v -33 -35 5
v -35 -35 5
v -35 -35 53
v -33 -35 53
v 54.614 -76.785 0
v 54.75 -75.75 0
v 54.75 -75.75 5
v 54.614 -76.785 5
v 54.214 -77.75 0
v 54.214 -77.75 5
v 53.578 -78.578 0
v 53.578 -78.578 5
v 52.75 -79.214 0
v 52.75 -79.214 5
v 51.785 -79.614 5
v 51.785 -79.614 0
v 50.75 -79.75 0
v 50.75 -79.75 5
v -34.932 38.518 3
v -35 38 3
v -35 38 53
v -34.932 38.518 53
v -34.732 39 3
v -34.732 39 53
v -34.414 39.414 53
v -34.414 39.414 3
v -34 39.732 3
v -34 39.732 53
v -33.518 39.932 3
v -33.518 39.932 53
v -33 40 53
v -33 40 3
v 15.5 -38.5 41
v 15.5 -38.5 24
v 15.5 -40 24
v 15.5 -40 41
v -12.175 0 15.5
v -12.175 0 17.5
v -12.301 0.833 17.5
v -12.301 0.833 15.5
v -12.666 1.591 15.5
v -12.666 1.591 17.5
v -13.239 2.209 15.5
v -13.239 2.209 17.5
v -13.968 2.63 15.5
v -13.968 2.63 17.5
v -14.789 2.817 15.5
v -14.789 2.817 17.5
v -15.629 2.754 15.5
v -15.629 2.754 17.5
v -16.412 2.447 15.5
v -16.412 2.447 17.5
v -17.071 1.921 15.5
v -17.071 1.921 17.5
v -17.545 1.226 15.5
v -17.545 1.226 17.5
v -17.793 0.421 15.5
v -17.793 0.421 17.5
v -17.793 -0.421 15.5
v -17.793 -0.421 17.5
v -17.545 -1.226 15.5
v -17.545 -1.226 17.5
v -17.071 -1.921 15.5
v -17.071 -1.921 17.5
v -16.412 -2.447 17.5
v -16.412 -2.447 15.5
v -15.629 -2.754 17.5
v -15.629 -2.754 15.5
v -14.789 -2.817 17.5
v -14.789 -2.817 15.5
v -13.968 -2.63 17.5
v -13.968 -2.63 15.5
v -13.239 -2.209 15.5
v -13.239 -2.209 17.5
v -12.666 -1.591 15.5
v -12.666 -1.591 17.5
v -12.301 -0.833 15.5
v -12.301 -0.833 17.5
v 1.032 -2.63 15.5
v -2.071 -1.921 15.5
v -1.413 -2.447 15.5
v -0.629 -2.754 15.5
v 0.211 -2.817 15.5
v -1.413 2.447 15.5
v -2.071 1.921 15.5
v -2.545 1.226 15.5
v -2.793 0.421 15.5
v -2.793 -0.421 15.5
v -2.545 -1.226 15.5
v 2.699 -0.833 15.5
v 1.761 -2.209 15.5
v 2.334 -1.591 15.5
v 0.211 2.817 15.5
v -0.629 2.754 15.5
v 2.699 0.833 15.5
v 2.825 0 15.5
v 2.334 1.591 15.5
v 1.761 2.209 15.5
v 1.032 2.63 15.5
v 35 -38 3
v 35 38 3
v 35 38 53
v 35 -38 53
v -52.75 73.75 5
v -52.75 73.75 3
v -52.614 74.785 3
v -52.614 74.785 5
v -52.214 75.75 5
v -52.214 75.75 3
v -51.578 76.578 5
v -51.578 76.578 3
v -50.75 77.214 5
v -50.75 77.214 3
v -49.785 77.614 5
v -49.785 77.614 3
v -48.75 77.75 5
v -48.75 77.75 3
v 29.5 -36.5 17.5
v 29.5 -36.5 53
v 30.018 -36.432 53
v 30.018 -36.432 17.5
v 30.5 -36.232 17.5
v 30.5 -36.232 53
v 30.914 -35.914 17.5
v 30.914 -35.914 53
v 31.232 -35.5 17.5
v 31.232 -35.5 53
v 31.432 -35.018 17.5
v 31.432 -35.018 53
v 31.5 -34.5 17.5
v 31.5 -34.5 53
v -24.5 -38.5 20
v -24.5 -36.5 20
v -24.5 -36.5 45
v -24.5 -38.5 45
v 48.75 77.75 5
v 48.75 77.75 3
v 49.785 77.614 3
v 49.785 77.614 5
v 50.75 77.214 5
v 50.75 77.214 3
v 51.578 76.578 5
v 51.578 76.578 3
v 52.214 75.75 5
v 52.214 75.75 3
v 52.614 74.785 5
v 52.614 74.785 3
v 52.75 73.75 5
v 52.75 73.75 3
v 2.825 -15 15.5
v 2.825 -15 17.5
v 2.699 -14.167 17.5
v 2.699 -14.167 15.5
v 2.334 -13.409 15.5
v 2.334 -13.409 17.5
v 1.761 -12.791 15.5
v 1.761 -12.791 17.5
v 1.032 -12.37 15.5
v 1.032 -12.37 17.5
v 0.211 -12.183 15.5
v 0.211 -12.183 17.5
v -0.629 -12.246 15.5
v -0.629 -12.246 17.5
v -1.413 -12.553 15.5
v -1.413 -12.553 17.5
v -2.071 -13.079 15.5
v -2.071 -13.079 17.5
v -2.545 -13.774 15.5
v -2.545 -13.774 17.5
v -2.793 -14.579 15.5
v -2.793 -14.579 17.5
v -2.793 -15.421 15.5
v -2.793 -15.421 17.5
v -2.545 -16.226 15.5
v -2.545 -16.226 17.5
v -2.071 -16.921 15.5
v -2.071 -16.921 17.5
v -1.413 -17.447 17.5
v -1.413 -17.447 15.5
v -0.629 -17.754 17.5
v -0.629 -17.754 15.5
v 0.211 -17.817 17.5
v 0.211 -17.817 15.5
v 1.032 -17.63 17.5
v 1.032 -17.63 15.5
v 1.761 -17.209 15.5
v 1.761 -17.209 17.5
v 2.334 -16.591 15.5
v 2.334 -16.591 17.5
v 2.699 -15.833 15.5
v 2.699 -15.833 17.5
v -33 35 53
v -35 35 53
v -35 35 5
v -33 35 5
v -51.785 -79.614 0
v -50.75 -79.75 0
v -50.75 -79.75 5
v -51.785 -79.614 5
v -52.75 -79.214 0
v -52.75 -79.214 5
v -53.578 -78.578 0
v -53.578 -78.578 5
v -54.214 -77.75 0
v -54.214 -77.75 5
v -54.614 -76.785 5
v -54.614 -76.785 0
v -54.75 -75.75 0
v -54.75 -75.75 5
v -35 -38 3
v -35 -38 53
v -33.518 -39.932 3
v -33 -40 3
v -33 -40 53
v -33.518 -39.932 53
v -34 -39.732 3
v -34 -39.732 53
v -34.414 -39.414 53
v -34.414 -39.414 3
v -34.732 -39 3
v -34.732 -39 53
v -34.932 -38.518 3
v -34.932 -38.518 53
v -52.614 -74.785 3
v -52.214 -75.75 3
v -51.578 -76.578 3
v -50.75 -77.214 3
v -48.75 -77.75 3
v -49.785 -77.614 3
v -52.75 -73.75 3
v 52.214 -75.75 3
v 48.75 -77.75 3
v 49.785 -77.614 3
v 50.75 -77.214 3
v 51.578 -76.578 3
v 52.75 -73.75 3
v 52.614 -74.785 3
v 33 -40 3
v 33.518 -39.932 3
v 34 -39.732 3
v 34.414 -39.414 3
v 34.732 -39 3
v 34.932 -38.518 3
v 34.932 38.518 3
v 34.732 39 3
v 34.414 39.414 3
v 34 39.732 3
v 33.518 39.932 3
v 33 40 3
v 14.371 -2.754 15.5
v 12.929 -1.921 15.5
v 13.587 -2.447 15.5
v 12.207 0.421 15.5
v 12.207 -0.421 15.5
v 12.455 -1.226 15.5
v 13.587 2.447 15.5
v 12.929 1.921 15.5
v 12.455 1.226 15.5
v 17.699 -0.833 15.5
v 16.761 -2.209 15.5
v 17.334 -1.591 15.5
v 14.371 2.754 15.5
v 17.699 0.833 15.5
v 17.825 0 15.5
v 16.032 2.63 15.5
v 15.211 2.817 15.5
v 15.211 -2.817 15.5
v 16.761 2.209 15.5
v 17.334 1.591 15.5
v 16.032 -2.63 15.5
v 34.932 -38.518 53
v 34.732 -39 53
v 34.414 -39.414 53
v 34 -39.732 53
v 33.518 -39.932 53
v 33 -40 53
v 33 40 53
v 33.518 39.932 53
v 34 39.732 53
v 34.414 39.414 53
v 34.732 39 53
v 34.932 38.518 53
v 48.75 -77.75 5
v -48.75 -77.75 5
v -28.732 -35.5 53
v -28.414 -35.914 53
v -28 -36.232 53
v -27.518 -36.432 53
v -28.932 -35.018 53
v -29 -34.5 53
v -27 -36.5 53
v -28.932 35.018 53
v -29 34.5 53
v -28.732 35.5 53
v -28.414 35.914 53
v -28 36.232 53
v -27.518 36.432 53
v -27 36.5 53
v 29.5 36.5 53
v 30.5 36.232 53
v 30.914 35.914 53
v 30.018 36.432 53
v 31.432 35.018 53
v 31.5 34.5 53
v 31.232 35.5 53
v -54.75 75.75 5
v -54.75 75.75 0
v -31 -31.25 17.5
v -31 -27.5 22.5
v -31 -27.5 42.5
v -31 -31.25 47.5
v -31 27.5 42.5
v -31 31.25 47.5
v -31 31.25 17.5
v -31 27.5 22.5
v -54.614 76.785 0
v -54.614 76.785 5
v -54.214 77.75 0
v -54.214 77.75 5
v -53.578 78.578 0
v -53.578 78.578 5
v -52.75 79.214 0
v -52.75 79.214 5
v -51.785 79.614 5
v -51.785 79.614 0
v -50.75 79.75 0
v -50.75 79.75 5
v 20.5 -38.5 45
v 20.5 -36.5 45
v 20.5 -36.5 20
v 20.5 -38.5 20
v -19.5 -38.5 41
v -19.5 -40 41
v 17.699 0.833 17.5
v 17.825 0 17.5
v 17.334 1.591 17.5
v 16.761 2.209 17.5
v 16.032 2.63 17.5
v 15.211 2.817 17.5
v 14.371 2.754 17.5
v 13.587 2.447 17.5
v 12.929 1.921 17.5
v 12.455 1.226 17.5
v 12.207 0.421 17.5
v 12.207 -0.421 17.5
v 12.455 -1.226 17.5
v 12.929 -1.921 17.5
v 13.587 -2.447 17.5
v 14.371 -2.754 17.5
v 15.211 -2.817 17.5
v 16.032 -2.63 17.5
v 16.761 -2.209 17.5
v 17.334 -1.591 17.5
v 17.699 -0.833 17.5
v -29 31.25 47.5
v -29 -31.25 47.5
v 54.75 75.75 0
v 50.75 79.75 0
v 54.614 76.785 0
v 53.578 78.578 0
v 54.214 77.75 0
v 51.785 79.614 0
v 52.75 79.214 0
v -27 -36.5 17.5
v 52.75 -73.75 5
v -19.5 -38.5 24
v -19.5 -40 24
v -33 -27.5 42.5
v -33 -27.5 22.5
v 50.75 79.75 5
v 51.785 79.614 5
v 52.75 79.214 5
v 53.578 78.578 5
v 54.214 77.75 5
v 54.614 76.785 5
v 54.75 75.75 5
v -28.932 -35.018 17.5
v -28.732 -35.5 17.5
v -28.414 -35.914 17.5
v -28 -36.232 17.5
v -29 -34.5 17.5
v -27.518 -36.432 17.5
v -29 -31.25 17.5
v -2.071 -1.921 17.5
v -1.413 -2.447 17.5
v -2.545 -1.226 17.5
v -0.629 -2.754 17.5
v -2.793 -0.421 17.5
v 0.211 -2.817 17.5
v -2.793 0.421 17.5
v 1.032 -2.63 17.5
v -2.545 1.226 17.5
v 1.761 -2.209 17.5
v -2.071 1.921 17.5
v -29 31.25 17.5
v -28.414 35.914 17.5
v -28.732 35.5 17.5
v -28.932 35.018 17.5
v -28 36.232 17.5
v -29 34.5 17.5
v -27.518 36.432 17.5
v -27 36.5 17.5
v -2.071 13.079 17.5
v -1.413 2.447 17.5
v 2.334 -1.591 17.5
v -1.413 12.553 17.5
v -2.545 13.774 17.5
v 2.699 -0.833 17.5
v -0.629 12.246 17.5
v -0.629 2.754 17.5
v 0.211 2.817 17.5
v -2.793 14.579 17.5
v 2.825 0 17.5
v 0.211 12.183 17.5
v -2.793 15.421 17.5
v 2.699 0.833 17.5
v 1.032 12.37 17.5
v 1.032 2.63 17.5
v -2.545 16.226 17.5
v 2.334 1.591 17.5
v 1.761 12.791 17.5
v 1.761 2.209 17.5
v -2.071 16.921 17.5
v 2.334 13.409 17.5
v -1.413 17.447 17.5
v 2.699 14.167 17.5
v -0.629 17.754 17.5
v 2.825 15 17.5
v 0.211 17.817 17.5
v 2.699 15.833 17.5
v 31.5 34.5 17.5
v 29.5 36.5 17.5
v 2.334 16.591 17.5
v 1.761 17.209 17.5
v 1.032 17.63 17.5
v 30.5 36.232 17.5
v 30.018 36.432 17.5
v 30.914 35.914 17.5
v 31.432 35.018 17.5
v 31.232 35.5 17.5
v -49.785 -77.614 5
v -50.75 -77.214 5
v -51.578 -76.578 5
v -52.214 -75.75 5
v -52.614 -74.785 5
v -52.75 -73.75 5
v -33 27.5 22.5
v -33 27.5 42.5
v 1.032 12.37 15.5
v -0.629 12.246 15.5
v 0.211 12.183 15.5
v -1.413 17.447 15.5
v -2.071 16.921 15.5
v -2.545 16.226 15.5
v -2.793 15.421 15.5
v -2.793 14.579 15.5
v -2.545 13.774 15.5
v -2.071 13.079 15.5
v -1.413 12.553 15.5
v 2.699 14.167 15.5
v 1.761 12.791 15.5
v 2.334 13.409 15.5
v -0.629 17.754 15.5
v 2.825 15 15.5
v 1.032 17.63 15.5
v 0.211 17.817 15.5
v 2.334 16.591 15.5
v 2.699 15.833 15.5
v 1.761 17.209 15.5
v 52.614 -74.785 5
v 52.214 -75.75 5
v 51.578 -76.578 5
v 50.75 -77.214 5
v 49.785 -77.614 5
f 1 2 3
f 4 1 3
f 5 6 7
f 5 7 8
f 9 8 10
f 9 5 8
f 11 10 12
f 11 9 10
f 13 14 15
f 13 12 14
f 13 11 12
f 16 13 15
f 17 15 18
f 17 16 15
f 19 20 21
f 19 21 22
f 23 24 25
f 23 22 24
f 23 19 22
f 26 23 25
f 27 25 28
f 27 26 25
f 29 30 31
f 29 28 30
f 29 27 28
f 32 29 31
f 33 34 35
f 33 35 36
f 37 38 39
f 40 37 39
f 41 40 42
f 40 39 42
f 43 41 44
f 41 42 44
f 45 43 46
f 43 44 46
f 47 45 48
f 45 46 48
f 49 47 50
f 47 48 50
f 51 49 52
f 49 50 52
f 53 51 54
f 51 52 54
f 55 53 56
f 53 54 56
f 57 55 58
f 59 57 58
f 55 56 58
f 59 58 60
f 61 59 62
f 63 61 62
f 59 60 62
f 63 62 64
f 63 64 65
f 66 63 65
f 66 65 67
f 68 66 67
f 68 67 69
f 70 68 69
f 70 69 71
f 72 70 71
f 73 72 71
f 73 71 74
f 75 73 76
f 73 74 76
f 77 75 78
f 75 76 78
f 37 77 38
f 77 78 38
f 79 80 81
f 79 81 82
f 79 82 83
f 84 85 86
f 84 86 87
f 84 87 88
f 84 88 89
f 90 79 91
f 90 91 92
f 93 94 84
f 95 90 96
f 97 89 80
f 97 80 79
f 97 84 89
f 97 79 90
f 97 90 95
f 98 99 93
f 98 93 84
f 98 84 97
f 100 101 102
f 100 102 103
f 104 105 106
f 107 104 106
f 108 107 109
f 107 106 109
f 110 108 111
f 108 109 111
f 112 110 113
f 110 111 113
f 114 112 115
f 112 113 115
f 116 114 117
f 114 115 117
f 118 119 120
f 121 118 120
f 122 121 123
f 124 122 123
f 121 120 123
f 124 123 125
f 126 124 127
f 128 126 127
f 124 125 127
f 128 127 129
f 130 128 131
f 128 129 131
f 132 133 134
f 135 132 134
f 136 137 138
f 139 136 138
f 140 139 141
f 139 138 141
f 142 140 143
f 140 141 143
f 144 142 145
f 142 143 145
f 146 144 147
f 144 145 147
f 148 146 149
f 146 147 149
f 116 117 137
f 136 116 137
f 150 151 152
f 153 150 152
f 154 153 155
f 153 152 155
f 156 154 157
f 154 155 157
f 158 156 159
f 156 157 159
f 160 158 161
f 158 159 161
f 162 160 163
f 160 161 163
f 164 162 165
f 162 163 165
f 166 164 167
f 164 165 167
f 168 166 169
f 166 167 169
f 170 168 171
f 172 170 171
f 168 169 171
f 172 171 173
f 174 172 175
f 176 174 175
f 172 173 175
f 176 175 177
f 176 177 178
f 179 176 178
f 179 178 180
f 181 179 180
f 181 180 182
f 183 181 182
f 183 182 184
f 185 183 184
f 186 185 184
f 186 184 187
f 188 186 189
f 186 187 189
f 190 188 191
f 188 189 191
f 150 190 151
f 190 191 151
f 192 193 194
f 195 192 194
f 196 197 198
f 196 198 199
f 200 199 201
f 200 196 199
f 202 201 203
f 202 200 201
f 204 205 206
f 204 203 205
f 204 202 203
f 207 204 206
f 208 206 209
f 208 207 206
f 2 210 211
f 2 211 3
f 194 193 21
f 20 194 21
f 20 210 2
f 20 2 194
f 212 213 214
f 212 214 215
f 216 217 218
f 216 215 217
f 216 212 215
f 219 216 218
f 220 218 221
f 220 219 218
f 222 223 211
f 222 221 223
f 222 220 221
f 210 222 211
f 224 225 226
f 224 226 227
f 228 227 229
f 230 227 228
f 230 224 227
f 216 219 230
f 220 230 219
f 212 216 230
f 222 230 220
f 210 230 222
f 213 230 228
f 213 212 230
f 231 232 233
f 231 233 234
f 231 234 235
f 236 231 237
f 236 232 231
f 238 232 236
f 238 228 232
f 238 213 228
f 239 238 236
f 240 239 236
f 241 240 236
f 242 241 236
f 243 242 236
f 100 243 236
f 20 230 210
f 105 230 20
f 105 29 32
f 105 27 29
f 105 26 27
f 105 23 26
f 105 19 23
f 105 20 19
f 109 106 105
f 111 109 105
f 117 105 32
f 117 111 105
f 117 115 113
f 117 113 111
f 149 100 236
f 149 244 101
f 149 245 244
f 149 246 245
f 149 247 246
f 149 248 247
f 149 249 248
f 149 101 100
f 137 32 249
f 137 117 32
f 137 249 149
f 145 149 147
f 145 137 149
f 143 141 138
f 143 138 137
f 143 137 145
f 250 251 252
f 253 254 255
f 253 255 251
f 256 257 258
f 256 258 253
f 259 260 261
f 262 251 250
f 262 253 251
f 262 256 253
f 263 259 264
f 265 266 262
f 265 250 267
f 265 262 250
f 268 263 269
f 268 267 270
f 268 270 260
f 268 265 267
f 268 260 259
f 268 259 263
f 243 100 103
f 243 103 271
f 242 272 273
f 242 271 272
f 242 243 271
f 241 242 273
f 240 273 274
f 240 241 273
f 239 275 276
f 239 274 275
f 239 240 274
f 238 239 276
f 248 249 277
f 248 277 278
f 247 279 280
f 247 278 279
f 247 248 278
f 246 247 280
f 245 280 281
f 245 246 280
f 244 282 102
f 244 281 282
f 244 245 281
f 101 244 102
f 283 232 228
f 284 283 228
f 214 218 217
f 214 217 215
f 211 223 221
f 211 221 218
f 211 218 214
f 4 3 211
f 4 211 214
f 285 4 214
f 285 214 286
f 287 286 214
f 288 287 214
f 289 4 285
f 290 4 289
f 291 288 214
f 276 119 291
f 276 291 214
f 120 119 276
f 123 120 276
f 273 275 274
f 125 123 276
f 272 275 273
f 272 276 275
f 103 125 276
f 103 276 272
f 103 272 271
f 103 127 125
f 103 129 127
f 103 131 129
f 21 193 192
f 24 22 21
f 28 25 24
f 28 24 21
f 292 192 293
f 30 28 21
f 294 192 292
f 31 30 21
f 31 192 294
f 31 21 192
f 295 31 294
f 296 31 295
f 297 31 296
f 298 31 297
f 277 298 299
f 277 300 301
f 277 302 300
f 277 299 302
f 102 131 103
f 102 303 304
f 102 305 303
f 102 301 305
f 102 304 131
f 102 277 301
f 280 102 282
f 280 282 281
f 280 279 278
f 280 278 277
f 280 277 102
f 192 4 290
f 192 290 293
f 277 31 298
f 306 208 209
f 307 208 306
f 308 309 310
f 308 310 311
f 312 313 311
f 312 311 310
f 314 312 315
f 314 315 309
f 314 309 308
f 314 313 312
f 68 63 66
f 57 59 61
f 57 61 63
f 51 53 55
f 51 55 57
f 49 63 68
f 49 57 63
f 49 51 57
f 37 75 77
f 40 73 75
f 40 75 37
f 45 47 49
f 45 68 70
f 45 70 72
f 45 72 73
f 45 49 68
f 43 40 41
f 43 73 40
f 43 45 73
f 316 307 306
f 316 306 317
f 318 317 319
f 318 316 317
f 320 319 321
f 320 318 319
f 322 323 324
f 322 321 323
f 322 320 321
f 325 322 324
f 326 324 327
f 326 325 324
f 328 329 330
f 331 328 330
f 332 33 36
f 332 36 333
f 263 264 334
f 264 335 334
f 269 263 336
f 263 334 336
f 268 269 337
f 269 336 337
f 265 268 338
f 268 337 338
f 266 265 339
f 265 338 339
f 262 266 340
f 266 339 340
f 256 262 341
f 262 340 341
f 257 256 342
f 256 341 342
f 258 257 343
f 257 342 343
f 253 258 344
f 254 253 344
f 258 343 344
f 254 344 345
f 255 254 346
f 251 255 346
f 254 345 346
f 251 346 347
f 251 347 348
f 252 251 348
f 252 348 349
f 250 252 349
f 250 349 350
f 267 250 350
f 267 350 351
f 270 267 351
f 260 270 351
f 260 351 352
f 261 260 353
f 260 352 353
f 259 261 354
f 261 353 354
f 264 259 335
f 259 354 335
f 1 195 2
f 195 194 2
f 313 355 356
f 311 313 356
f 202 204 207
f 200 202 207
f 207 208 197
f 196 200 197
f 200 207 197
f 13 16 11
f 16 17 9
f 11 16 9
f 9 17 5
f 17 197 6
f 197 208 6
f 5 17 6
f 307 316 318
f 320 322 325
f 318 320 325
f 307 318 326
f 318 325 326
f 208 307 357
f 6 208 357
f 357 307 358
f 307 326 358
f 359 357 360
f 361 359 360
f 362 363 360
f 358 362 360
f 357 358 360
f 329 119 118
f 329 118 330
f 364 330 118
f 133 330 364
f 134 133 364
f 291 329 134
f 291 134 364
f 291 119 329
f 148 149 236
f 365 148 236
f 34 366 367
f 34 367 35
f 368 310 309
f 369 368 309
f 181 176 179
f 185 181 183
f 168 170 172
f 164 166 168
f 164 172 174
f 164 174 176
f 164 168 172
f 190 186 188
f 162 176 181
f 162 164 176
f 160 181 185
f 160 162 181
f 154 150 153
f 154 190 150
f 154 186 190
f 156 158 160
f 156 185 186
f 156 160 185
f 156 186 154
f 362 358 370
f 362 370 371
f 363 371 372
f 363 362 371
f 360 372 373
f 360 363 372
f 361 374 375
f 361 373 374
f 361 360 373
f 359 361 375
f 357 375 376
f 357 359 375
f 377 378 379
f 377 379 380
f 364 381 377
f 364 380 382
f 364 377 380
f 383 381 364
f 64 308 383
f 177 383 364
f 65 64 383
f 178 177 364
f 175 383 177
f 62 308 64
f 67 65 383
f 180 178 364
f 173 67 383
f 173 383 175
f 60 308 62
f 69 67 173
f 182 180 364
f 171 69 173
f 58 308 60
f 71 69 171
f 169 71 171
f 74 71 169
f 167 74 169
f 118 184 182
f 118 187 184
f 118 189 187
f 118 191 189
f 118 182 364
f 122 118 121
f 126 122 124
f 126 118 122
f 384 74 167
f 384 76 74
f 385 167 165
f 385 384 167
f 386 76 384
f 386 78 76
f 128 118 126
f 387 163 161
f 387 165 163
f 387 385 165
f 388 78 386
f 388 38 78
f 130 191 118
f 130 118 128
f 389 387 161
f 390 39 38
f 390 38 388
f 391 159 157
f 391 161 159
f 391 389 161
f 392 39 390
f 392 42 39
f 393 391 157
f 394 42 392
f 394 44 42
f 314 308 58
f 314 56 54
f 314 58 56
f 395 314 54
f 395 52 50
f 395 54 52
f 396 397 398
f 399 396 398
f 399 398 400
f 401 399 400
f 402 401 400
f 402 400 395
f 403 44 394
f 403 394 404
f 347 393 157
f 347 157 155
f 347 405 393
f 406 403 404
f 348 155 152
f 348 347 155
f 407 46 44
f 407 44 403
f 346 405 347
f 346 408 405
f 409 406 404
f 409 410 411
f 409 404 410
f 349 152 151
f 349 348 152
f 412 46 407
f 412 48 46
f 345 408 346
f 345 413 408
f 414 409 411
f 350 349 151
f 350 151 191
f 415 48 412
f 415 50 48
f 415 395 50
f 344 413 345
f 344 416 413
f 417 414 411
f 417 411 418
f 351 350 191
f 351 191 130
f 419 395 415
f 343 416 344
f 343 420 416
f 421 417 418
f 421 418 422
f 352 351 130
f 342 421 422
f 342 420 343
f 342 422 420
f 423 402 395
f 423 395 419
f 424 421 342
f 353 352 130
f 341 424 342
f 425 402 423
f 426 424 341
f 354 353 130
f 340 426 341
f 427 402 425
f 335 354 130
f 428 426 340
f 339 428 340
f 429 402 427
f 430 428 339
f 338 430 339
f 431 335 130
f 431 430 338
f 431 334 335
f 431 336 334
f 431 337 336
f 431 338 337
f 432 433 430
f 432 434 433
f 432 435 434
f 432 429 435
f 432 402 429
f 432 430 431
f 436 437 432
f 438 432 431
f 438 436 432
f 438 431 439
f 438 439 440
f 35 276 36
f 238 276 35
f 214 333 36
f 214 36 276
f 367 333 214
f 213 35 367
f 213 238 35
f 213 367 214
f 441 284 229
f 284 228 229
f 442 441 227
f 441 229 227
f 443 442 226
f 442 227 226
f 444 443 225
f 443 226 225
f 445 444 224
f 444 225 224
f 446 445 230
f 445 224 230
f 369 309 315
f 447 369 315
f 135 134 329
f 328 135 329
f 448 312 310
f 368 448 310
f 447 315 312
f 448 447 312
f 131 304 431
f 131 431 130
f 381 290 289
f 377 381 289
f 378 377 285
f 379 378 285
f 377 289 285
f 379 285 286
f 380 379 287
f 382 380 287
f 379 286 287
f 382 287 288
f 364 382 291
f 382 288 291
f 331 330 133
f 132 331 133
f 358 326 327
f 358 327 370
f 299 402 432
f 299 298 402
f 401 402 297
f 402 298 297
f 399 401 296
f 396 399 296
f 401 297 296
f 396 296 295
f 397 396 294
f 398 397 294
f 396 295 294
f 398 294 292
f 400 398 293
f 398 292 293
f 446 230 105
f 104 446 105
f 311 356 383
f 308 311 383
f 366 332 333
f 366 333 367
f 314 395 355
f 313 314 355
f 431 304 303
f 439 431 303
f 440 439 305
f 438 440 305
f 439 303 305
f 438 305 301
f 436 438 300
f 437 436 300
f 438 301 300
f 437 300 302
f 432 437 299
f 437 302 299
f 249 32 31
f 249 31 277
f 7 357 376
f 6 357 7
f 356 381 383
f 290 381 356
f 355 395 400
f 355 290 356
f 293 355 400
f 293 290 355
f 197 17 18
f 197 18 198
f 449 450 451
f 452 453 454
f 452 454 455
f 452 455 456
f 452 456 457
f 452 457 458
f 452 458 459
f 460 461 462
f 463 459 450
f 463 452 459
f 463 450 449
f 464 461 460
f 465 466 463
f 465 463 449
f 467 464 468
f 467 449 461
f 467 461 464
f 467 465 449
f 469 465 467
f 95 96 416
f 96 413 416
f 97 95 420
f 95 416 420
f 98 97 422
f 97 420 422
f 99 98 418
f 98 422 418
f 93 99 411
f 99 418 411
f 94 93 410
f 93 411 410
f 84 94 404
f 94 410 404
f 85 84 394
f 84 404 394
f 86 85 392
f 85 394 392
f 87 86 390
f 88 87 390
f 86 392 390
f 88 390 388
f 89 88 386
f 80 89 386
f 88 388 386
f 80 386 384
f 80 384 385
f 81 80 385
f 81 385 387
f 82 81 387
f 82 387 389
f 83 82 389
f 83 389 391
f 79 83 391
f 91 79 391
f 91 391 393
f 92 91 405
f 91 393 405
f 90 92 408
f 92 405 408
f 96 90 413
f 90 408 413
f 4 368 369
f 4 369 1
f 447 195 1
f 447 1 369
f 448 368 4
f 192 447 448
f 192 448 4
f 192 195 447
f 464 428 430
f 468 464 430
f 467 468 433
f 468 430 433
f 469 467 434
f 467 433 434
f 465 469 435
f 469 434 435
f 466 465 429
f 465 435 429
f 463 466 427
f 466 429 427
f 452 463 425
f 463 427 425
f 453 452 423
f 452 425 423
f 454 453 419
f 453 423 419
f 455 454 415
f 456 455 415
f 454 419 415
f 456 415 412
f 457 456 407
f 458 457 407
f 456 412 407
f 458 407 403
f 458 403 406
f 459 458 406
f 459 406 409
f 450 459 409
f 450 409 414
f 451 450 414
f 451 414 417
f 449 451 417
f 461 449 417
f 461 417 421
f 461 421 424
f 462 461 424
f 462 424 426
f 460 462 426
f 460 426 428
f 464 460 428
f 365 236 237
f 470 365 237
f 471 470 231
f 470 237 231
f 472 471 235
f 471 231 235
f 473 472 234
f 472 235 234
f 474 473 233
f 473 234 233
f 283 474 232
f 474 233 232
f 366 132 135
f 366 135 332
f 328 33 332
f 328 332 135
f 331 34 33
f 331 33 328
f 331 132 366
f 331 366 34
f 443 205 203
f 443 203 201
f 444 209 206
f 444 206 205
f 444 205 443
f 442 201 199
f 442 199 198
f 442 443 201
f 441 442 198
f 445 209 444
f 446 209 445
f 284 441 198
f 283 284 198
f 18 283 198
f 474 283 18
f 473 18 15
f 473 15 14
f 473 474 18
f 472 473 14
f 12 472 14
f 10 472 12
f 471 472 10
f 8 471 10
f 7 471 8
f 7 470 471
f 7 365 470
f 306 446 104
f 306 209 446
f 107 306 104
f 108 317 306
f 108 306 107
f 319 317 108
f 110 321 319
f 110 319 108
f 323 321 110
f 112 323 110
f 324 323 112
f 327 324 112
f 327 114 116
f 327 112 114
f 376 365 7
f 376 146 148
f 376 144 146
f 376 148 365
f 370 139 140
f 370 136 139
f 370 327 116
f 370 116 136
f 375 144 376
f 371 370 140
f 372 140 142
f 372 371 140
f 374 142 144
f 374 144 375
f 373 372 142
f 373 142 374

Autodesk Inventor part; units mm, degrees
ref_plane "YZ Plane" through (0, 0, 0) normal (1, 0, 0) x (0, 1, 0)
ref_plane "XZ Plane" through (0, 0, 0) normal (0, 1, 0) x (-1, 0, 0)
ref_plane "XY Plane" through (0, 0, 0) normal (0, 0, 1) x (1, 0, 0)
sketch "Sketch1" plane through (0, 0, 0) normal (0, 0, 1) x (1, 0, 0)
  line L0 (-50.75, 79.75) -> (50.75, 79.75)
  line L1 (54.75, 75.75) -> (54.75, -75.75)
  line L2 (50.75, -79.75) -> (-50.75, -79.75)
  line L3 (-54.75, -75.75) -> (-54.75, 75.75)
  arc A0 (-50.75, 79.75) -> (-54.75, 75.75) centre (-50.75, 75.75) ccw
  arc A1 (-54.75, -75.75) -> (-50.75, -79.75) centre (-50.75, -75.75) ccw
  arc A2 (50.75, -79.75) -> (54.75, -75.75) centre (50.75, -75.75) ccw
  arc A3 (54.75, 75.75) -> (50.75, 79.75) centre (50.75, 75.75) ccw
  point P0 (0, 0)
  point P1 (-54.75, 79.75)
  point P2 (54.75, 79.75)
  point P3 (-54.75, -79.75)
  dimension "d0" = 109.5
  dimension "d1" = 159.5
  dimension "d2" = 54.75
  dimension "d3" = 79.75
  dimension "d4" = 4
extrude "xyAttach" add sketch "Sketch1" along normal blind 3
sketch "Sketch2" plane through (0, 0, 3) normal (0, 0, 1) x (1, 0, 0)
  line L0 (-50.75, 79.75) -> (50.75, 79.75)
  line L1 (54.75, 75.75) -> (54.75, -75.75)
  line L2 (50.75, -79.75) -> (-50.75, -79.75)
  line L3 (-54.75, -75.75) -> (-54.75, 75.75)
  line L4 (50.75, 79.75) -> (-50.75, 79.75) projected
  line L5 (-54.75, 75.75) -> (-54.75, -75.75) projected
  line L6 (-50.75, -79.75) -> (50.75, -79.75) projected
  line L7 (54.75, -75.75) -> (54.75, 75.75) projected
  arc A0 (-50.75, 79.75) -> (-54.75, 75.75) centre (-50.75, 75.75) ccw
  arc A1 (-54.75, -75.75) -> (-50.75, -79.75) centre (-50.75, -75.75) ccw
  arc A2 (50.75, -79.75) -> (54.75, -75.75) centre (50.75, -75.75) ccw
  arc A3 (54.75, 75.75) -> (50.75, 79.75) centre (50.75, 75.75) ccw
  line L8 (-48.75, 77.75) -> (48.75, 77.75)
  line L9 (52.75, 73.75) -> (52.75, -73.75)
  line L10 (48.75, -77.75) -> (-48.75, -77.75)
  line L11 (-52.75, -73.75) -> (-52.75, 73.75)
  arc A4 (-48.75, 77.75) -> (-52.75, 73.75) centre (-48.75, 73.75) ccw
  arc A5 (-52.75, -73.75) -> (-48.75, -77.75) centre (-48.75, -73.75) ccw
  arc A6 (48.75, -77.75) -> (52.75, -73.75) centre (48.75, -73.75) ccw
  arc A7 (52.75, 73.75) -> (48.75, 77.75) centre (48.75, 73.75) ccw
  point P0 (0, 0)
  dimension "d7" = 4
  dimension "d8" = 4
  dimension "d9" = 2
  dimension "d10" = 2
  dimension "d11" = 2
  dimension "d12" = 2
extrude "spillExtrusion" add sketch "Sketch2" along normal blind 2
sketch "Sketch3" plane through (0, 0, 3) normal (0, 0, 1) x (1, 0, 0)
  line L0 (-33, 40) -> (33, 40)
  line L1 (35, 38) -> (35, -38)
  line L2 (33, -40) -> (-33, -40)
  line L3 (-35, -38) -> (-35, 38)
  arc A0 (-33, 40) -> (-35, 38) centre (-33, 38) ccw
  arc A1 (-35, -38) -> (-33, -40) centre (-33, -38) ccw
  arc A2 (35, 38) -> (33, 40) centre (33, 38) ccw
  arc A3 (33, -40) -> (35, -38) centre (33, -38) ccw
  point P0 (0, 0)
  point P1 (-35, 40)
  point P2 (35, -40)
  point P3 (35, 40)
  dimension "d15" = 70
  dimension "d16" = 35
  dimension "d17" = 80
  dimension "d18" = 40
  dimension "d19" = 2
extrude "chamberWallExtrusion" add sketch "Sketch3" along normal blind 50
sketch "Sketch4" plane through (0, 0, 53) normal (0, 0, 1) x (1, 0, 0)
  line L0 (-27, 36.5) -> (29.5, 36.5)
  line L1 (31.5, 34.5) -> (31.5, -34.5)
  line L2 (29.5, -36.5) -> (-27, -36.5)
  line L3 (-29, -34.5) -> (-29, 34.5)
  arc A0 (-27, 36.5) -> (-29, 34.5) centre (-27, 34.5) ccw
  arc A1 (-29, -34.5) -> (-27, -36.5) centre (-27, -34.5) ccw
  arc A2 (29.5, -36.5) -> (31.5, -34.5) centre (29.5, -34.5) ccw
  arc A3 (31.5, 34.5) -> (29.5, 36.5) centre (29.5, 34.5) ccw
  line L4 (33, 40) -> (-33, 40) projected
  line L5 (35, -38) -> (35, 38) projected
  line L6 (-33, -40) -> (33, -40) projected
  line L7 (-35, 38) -> (-35, -38) projected
  point P0 (0, 0)
  dimension "d22" = 2
  dimension "d23" = 3.5
  dimension "d24" = 3.5
  dimension "d25" = 3.5
  dimension "d26" = 6
extrude "chamberInteriorExtrusion" cut sketch "Sketch4" against normal blind 35.5
sketch "Sketch5" plane through (-29, -34.5, 53) normal (1, 0, 0) x (0, 0, -1)
  line L0 (5.5, 3.25) -> (35.5, 3.25)
  line L1 (35.5, 3.25) -> (35.5, 65.75)
  line L2 (35.5, 65.75) -> (5.5, 65.75)
  line L3 (5.5, 65.75) -> (5.5, 3.25)
  line L4 (48, 110.25) -> (48, -41.25) projected
  point P0 (53, 34.5)
  dimension "d29" = 62.5
  dimension "d30" = 30
  dimension "d31" = 31.25
  dimension "d32" = 42.5
extrude "rectCoverSlipMountExtrusion" cut sketch "Sketch5" against normal blind 2
sketch "Sketch6" plane through (-31, -34.5, 53) normal (1, 0, 0) x (0, 0, -1)
  line L0 (10.5, 7) -> (30.5, 7)
  line L1 (30.5, 7) -> (30.5, 62)
  line L2 (30.5, 62) -> (10.5, 62)
  line L3 (10.5, 62) -> (10.5, 7)
  line L4 (48, -39.25) -> (48, 108.25) projected
  point P0 (53, 34.5)
  dimension "d35" = 55
  dimension "d36" = 20
  dimension "d37" = 37.5
  dimension "d38" = 27.5
extrude "rectCoverSlipWindow" cut sketch "Sketch6" against normal up to surface (4 mm away)
sketch "Sketch7" plane through (-35, -38, 3) normal (-1, 0, 0) x (0, 0, 1)
  line L0 (50, 73) -> (2, 73)
  line L1 (2, 73) -> (2, 3)
  line L2 (2, 3) -> (50, 3)
  line L3 (50, 3) -> (50, 73)
  line L4 (50, 76) -> (50, 0) projected
  line L5 (2, 113.75) -> (2, -37.75) projected
  point P0 (-3, 38)
  dimension "d41" = 70
  dimension "d42" = 35
extrude "illObjExtrusion" cut sketch "Sketch7" against normal blind 2
sketch "Sketch8" plane through (-27, -36.5, 53) normal (0, 1, 0) x (1, 0, 0)
  line L0 (47.5, 33) -> (2.5, 33)
  line L1 (2.5, 33) -> (2.5, 8)
  line L2 (2.5, 8) -> (47.5, 8)
  line L3 (47.5, 8) -> (47.5, 33)
  point P0 (27, 53)
  point P1 (-27.75, 48)
  point P2 (-2, 0)
  dimension "d46" = 45
  dimension "d47" = 25
  dimension "d48" = 40
  dimension "d69" = 4.5
extrude "viewingWindowCoverslipMount" cut sketch "Sketch8" against normal blind 2
sketch "Sketch9" plane through (-27, -38.5, 53) normal (0, 1, 0) x (1, 0, 0)
  line L0 (7.5, 29) -> (42.5, 29)
  line L1 (42.5, 29) -> (42.5, 12)
  line L2 (42.5, 12) -> (7.5, 12)
  line L3 (7.5, 12) -> (7.5, 29)
  line L4 (-23.75, 48) -> (77.75, 48) projected
  line L5 (2.5, 8) -> (2.5, 33) projected
  point P0 (27, 53)
  point P1 (-2, 0)
  dimension "d52" = 35
  dimension "d53" = 17
  dimension "d55" = 36
  dimension "d71" = 5
extrude "viewingWindowExt" cut sketch "Sketch9" against normal up to surface (1.5 mm away)
sketch "Sketch10" plane through (0, 0, 17.5) normal (0, 0, 1) x (1, 0, 0)
  circle A0 centre (-15, 0) radius 2.825
  circle A1 centre (0, 15) radius 2.825
  circle A2 centre (15, 0) radius 2.825
  circle A3 centre (0, -15) radius 2.825
  circle A4 centre (0, 0) radius 2.825
  dimension "d58" = 5.65
  dimension "d59" = 5.65
  dimension "d60" = 5.65
  dimension "d61" = 5.65
  dimension "d62" = 5.65
  dimension "d63" = 15
  dimension "d64" = 15
  dimension "d65" = 15
  dimension "d66" = 15
extrude "sampleMountExt" cut sketch "Sketch10" against normal blind 2
equation "\"d2\" = 0.5 * d0"
equation "\"d3\" = 0.5 * d1"
equation "\"d10\" = d9"
equation "\"d11\" = d9"
equation "\"d12\" = d9"
equation "\"d16\" = 0.5 * d15"
equation "\"d18\" = 0.5 * d17"
equation "\"d24\" = d23"
equation "\"d25\" = d23"
equation "\"d31\" = 0.5 * d29"
equation "\"d38\" = 0.5 * d35"
equation "\"d42\" = 0.5 * d41"
equation "\"d59\" = d58"
equation "\"d60\" = d58"
equation "\"d61\" = d58"
equation "\"d62\" = d58"
equation "\"d64\" = d63"
equation "\"d65\" = d63"
equation "\"d66\" = d63"
properties part number "sampleChamberExt_v1"
